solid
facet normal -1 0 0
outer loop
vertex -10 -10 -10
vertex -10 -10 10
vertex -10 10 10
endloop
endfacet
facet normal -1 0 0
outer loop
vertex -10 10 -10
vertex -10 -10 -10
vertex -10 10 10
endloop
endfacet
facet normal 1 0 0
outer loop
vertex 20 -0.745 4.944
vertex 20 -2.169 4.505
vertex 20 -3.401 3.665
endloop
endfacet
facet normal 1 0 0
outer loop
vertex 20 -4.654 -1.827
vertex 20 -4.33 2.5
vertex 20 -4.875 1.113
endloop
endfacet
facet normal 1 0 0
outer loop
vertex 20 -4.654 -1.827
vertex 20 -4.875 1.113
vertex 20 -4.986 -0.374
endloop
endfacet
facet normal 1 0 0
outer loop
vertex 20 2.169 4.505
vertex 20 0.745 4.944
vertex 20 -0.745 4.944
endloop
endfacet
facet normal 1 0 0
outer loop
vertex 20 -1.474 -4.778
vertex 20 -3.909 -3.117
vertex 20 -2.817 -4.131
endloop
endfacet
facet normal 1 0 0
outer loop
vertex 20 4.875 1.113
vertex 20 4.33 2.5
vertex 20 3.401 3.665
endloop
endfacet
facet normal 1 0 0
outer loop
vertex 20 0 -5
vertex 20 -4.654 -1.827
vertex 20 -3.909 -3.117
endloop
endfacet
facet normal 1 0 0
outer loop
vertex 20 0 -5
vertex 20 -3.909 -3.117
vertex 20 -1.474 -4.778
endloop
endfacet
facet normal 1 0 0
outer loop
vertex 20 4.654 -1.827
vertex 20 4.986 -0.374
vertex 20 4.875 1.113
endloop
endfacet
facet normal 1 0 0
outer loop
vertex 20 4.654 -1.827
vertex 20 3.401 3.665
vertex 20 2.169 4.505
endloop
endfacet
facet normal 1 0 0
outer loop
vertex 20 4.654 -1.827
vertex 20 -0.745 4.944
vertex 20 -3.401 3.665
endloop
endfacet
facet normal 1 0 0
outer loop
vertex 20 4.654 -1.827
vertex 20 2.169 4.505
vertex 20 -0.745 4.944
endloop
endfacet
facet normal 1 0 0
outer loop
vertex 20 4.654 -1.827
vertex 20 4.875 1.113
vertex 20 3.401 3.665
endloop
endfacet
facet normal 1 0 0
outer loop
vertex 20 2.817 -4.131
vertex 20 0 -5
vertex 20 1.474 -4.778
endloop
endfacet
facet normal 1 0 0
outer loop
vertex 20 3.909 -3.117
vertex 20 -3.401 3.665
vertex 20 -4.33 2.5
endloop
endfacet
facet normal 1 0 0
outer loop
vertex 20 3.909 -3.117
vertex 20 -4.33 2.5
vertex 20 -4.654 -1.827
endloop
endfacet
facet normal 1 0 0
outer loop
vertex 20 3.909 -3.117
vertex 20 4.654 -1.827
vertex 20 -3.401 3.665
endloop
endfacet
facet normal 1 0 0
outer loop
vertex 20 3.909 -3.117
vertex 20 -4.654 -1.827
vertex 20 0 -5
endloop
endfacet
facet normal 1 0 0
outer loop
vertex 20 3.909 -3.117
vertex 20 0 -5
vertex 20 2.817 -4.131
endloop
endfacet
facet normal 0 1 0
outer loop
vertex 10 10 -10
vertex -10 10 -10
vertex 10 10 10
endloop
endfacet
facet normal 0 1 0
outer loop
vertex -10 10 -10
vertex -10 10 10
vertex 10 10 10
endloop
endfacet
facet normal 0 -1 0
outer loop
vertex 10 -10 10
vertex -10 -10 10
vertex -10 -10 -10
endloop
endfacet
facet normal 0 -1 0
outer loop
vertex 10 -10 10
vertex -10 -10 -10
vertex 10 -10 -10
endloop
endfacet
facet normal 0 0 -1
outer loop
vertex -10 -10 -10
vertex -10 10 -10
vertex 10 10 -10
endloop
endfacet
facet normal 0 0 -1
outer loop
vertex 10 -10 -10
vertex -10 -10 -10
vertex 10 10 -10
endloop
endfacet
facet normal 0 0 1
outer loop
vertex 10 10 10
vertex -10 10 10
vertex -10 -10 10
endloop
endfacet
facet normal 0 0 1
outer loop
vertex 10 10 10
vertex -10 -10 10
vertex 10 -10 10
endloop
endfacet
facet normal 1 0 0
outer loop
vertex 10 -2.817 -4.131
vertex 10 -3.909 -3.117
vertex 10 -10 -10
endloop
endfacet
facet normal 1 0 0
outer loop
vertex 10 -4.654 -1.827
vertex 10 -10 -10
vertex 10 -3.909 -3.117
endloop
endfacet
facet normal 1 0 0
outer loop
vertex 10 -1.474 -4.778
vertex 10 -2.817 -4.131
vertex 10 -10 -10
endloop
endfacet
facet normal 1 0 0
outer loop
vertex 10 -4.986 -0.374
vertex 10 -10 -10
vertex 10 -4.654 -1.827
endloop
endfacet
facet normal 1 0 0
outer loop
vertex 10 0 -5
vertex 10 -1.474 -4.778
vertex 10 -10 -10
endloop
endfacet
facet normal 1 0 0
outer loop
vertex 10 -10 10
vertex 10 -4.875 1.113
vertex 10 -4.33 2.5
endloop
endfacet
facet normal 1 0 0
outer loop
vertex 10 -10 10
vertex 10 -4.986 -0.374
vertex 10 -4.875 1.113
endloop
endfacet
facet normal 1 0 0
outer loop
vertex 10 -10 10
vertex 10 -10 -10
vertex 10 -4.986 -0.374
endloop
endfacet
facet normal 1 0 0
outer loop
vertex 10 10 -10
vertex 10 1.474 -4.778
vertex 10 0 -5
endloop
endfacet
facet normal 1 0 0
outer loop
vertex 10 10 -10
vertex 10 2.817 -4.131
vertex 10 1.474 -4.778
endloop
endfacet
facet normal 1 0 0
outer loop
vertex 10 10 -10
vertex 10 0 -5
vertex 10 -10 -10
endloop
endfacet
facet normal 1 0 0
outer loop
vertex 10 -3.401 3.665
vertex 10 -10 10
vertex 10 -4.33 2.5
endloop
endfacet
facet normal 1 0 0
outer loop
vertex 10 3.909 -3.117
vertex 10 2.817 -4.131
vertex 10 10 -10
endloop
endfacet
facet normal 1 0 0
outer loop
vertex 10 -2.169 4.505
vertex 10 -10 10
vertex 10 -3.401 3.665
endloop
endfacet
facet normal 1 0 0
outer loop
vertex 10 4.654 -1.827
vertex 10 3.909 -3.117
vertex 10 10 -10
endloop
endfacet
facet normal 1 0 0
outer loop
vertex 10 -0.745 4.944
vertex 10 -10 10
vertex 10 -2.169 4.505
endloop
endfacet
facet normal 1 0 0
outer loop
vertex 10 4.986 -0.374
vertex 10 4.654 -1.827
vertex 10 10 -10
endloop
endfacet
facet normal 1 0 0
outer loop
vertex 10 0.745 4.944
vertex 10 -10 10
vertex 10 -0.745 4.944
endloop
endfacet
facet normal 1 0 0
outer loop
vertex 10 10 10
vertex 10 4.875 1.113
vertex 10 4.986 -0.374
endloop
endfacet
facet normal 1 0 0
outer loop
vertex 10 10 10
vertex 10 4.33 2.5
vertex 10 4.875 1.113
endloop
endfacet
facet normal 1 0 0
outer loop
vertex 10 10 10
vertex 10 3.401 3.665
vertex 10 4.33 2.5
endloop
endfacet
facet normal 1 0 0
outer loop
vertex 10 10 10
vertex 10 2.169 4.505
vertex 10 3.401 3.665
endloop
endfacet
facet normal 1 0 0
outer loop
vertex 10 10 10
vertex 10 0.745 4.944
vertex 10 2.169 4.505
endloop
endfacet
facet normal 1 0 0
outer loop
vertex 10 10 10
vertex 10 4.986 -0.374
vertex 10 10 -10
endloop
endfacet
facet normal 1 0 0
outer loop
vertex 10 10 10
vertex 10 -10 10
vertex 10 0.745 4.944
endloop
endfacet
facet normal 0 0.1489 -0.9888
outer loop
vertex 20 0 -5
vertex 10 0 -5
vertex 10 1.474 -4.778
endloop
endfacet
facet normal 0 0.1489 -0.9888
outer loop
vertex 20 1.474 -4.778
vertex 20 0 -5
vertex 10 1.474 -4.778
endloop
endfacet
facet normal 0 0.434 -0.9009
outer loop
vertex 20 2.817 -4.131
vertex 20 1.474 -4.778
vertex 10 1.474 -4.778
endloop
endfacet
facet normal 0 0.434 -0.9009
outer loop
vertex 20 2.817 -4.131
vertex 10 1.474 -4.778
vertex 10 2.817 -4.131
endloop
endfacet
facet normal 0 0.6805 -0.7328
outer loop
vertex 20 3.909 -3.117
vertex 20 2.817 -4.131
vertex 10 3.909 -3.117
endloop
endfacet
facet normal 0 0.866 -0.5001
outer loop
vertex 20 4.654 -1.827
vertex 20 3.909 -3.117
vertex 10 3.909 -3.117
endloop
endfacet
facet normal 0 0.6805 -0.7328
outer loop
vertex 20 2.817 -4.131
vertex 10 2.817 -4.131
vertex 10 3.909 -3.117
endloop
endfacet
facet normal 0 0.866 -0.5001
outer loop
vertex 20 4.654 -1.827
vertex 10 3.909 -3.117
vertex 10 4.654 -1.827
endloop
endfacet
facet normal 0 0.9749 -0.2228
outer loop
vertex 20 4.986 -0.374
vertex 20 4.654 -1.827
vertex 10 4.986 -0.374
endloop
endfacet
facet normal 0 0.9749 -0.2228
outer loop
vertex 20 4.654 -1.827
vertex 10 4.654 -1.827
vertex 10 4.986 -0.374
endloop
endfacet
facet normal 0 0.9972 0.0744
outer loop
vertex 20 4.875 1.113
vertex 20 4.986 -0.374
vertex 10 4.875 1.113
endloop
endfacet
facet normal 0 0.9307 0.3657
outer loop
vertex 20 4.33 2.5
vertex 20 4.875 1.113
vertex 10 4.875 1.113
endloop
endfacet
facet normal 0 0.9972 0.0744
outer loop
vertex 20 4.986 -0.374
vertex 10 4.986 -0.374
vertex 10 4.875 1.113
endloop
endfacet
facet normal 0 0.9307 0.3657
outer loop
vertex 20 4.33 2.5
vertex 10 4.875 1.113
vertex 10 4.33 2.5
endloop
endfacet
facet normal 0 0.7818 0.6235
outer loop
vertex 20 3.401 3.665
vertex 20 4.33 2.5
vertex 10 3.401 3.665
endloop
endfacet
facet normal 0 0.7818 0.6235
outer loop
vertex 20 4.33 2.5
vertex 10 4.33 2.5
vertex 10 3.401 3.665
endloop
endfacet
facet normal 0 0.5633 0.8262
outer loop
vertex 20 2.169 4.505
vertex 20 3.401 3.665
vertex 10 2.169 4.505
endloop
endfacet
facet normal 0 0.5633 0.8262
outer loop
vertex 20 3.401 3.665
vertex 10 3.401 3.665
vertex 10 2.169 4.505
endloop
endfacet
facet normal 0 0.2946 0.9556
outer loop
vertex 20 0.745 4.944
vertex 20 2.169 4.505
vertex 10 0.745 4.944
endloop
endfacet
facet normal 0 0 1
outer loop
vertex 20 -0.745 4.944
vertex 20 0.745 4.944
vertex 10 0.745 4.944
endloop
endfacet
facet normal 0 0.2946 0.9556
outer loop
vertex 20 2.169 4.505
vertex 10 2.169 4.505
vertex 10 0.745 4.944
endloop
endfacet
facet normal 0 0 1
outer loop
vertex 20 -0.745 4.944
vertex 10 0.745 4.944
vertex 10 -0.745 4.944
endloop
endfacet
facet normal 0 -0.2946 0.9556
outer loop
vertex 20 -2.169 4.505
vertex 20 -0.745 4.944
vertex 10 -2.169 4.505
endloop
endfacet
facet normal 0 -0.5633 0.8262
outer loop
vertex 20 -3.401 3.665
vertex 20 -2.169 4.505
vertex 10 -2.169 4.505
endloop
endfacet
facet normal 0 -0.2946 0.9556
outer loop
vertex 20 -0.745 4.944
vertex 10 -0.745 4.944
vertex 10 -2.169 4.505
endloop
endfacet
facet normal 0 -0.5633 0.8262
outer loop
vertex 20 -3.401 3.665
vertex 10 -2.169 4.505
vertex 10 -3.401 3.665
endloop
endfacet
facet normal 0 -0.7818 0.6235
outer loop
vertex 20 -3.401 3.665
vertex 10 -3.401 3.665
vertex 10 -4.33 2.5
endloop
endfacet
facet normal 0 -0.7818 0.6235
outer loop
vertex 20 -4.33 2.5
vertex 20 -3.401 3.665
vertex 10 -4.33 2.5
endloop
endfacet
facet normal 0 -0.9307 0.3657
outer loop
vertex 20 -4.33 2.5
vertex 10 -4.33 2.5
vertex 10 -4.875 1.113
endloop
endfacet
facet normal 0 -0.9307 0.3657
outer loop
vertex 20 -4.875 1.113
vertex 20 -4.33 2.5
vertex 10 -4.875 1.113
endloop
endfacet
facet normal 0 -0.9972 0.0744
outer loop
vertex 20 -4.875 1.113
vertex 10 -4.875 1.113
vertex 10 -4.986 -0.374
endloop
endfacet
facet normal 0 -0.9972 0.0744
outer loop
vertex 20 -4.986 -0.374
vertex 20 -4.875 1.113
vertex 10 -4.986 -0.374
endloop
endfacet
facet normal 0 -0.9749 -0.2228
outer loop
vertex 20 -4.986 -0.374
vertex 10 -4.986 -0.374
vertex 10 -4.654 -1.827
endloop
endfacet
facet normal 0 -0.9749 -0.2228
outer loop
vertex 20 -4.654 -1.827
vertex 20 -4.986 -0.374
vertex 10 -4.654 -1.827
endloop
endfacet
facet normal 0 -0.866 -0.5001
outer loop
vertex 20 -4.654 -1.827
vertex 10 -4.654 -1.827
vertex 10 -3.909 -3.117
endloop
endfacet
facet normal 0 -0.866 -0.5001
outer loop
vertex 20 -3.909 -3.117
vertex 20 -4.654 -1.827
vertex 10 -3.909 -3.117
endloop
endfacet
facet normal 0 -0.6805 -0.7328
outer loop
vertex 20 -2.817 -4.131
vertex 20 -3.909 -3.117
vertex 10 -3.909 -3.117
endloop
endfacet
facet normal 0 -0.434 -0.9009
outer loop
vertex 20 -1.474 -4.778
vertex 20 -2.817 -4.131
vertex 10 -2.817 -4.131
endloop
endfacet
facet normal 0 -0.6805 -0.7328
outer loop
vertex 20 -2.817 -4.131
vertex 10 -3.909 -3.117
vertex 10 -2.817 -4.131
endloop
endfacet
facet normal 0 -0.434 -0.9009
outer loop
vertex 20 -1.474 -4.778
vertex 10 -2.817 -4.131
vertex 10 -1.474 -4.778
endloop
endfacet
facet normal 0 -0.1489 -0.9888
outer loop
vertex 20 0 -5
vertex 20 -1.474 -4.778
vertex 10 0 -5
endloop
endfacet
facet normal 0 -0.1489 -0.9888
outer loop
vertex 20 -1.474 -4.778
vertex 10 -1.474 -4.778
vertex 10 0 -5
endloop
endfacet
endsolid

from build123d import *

# Parameters (mm, degrees)
SKETCH_1_W      = 20
SKETCH_1_H      = 20
EXTRUDE_1_DEPTH = 10
SKETCH_2_R      = 5
EXTRUDE_2_DEPTH = 10


with BuildPart() as part:
    # 草图1 → 凸台-拉伸1 (new, symmetric)
    with BuildSketch(Plane.XY):
        Rectangle(SKETCH_1_W, SKETCH_1_H)
    extrude(amount=EXTRUDE_1_DEPTH, both=True)

    # 草图2 → 凸台-拉伸2 (add)
    with BuildSketch(Plane(origin=(10, 0, 0), x_dir=(0, 0, -1), z_dir=(1, 0, 0))):
        Circle(SKETCH_2_R)
    extrude(amount=EXTRUDE_2_DEPTH)


solid = part.part
